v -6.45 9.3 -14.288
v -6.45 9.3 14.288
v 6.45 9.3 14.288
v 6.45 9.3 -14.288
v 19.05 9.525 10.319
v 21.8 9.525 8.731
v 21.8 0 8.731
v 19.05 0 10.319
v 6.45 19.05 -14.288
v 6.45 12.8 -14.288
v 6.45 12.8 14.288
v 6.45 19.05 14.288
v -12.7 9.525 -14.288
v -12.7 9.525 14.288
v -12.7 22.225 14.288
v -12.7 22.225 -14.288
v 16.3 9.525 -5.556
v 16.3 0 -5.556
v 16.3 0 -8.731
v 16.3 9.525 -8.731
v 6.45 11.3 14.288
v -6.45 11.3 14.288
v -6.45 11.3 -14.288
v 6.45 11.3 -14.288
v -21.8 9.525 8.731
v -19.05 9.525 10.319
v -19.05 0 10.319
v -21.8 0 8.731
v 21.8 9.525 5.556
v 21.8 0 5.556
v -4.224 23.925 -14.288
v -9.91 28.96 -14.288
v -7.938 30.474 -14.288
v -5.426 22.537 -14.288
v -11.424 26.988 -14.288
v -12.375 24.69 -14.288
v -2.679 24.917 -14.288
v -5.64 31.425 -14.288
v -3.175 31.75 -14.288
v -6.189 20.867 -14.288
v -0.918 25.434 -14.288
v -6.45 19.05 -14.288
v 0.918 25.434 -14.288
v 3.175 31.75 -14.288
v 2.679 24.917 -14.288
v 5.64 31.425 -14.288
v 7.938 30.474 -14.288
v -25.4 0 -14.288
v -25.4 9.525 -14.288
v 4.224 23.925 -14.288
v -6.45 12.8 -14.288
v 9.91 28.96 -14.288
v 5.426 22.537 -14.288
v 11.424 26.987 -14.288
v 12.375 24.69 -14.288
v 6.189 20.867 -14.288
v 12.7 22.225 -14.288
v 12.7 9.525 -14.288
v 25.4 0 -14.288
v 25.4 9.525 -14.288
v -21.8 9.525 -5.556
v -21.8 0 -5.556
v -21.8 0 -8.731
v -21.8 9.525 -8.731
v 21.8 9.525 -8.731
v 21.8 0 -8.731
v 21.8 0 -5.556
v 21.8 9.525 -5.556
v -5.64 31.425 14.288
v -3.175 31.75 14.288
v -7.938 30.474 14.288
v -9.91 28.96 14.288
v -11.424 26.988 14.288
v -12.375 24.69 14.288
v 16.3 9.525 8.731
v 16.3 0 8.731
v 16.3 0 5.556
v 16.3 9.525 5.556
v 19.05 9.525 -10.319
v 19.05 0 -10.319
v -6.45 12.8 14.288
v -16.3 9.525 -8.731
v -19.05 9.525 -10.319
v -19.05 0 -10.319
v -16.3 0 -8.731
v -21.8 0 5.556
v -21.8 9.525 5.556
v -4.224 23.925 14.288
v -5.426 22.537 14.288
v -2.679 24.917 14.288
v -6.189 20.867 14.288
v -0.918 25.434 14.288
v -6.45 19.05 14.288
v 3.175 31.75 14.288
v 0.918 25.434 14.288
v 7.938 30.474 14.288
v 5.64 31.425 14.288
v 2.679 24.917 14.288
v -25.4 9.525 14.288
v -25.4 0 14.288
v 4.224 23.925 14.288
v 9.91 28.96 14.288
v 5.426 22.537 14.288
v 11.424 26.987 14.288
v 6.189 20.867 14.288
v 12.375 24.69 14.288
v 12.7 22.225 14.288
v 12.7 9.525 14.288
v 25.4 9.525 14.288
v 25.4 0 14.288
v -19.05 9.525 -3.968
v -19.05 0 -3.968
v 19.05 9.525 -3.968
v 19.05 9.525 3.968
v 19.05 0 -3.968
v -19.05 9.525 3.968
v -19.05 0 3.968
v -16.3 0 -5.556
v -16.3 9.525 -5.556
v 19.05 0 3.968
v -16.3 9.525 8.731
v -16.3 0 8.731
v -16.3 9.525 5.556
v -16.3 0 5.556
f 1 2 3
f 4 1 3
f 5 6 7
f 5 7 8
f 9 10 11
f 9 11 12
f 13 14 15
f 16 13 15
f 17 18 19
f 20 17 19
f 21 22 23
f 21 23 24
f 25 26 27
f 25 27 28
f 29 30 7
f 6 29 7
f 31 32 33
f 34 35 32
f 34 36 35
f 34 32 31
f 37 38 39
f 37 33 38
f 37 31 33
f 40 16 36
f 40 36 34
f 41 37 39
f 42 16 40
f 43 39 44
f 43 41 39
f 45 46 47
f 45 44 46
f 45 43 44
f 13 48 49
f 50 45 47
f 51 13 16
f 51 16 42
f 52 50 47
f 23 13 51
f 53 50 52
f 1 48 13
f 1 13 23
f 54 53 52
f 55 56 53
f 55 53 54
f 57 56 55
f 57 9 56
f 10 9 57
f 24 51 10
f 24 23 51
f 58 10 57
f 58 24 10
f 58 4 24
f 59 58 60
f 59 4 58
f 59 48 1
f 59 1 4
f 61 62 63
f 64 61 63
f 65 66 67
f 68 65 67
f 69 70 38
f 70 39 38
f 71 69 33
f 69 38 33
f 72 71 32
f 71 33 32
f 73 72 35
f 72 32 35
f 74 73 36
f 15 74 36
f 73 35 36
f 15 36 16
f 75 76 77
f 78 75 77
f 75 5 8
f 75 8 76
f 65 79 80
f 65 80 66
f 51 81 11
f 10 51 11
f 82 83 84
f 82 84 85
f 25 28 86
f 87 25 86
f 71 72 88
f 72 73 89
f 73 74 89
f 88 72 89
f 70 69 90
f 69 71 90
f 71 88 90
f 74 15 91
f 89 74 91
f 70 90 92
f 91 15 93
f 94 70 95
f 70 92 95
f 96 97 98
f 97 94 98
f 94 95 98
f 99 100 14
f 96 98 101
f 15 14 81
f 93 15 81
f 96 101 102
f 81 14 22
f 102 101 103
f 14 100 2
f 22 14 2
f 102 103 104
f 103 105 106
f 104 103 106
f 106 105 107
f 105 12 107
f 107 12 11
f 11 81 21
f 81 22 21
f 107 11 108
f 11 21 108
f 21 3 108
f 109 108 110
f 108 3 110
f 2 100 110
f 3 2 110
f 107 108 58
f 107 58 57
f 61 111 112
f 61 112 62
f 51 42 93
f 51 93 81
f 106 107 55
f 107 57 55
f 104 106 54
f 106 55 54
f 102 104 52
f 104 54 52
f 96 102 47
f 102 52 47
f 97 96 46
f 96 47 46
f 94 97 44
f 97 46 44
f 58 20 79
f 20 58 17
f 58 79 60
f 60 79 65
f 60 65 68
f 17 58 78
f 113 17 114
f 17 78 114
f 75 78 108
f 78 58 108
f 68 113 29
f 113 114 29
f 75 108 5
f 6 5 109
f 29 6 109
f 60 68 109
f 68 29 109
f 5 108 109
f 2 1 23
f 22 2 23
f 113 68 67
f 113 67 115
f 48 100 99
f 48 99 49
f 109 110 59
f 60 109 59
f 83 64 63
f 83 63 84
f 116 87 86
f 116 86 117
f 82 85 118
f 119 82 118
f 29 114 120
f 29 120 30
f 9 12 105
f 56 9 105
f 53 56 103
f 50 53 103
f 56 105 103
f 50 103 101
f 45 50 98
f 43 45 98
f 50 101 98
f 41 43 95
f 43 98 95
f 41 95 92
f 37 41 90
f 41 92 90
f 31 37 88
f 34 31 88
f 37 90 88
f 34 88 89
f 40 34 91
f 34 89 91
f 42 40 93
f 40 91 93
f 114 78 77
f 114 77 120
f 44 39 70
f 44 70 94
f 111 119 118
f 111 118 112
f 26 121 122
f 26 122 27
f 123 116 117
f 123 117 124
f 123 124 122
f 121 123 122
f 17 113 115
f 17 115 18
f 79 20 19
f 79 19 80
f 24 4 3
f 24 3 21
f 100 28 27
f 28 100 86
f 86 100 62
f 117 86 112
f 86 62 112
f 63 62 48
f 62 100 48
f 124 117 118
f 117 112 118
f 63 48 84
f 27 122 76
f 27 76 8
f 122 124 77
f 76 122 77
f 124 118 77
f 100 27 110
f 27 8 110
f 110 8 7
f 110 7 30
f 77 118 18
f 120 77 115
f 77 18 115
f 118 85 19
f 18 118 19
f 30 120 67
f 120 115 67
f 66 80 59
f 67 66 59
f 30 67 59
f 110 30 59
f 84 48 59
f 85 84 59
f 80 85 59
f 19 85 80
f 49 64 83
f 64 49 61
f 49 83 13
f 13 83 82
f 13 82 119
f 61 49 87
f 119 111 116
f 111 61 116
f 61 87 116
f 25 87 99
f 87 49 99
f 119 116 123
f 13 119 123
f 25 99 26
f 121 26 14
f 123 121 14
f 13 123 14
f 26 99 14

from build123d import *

# Parameters (mm, degrees)
SKETCH1_W           = 50.8
SKETCH1_H           = 28.575
BOSS_EXTRUDE1_DEPTH = 31.75
SKETCH2_W           = 12.7
SKETCH2_H           = 22.225
SKETCH2_W_2         = 12.9
SKETCH2_H_2         = 2
CUT_EXTRUDE1_DEPTH  = 28.575
FILLET2_R           = 9.525
CUT_EXTRUDE2_REACH  = 45.097


with BuildPart() as part:
    # Sketch1 → Boss-Extrude1 (new body)
    with BuildSketch(Plane(origin=(0, 0, 0), x_dir=(1, 0, 0), z_dir=(0, 1, 0))):
        Rectangle(SKETCH1_W, SKETCH1_H)
    extrude(amount=BOSS_EXTRUDE1_DEPTH)

    # Sketch2 → Cut-Extrude1 (cut)
    with BuildSketch(Plane.XY.offset(14.2875)):
        with Locations((-19.05, 20.6375)):
            Rectangle(SKETCH2_W, SKETCH2_H)
        with BuildLine():
            Line((6.45, 12.8), (6.45, 19.05))
            ThreePointArc((6.45, 19.05), (0, 25.5), (-6.45, 19.05))
            Line((-6.45, 19.05), (-6.45, 12.8))
            Line((-6.45, 12.8), (6.45, 12.8))
        make_face()
        with Locations((0, 10.3)):
            Rectangle(SKETCH2_W_2, SKETCH2_H_2)
        with Locations((19.05, 20.6375)):
            Rectangle(SKETCH2_W, SKETCH2_H)
    extrude(amount=-CUT_EXTRUDE1_DEPTH, mode=Mode.SUBTRACT)

    # Fillet2
    fillet2_edges = [part.edges().sort_by_distance(p)[0] for p in [
        (-12.7, 31.75, 0),
        (12.7, 31.75, 0),
    ]]
    fillet(fillet2_edges, radius=FILLET2_R)

    # Sketch9 → Cut-Extrude2 (cut, up to next)
    with BuildSketch(Plane.XZ, mode=Mode.PRIVATE) as cut_extrude2_sk1:
        Polygon((16.3, -5.55603676), (16.3, -8.73146324), (19.05, -10.319176481), (21.8, -8.73146324), (21.8, -5.55603676), (19.05, -3.968323519), align=None)
    cut_extrude2_tool1 = extrude(cut_extrude2_sk1.sketch, amount=-CUT_EXTRUDE2_REACH, mode=Mode.PRIVATE) & part.part
    # Sketch9 → Cut-Extrude2 (cut, up to next)
    with BuildSketch(Plane.XZ, mode=Mode.PRIVATE) as cut_extrude2_sk2:
        Polygon((16.3, 5.55603676), (19.05, 3.968323519), (21.8, 5.55603676), (21.8, 8.73146324), (19.05, 10.319176481), (16.3, 8.73146324), align=None)
    cut_extrude2_tool2 = extrude(cut_extrude2_sk2.sketch, amount=-CUT_EXTRUDE2_REACH, mode=Mode.PRIVATE) & part.part
    # Sketch9 → Cut-Extrude2 (cut, up to next)
    with BuildSketch(Plane.XZ, mode=Mode.PRIVATE) as cut_extrude2_sk3:
        Polygon((-16.3, -8.73146324), (-16.3, -5.55603676), (-19.05, -3.968323519), (-21.8, -5.55603676), (-21.8, -8.73146324), (-19.05, -10.319176481), align=None)
    cut_extrude2_tool3 = extrude(cut_extrude2_sk3.sketch, amount=-CUT_EXTRUDE2_REACH, mode=Mode.PRIVATE) & part.part
    # Sketch9 → Cut-Extrude2 (cut, up to next)
    with BuildSketch(Plane.XZ, mode=Mode.PRIVATE) as cut_extrude2_sk4:
        Polygon((-16.3, 5.55603676), (-16.3, 8.73146324), (-19.05, 10.319176481), (-21.8, 8.73146324), (-21.8, 5.55603676), (-19.05, 3.968323519), align=None)
    cut_extrude2_tool4 = extrude(cut_extrude2_sk4.sketch, amount=-CUT_EXTRUDE2_REACH, mode=Mode.PRIVATE) & part.part
    add(cut_extrude2_tool1.solids().sort_by_distance((19.05, 0, -7.14375))[0], mode=Mode.SUBTRACT)
    add(cut_extrude2_tool2.solids().sort_by_distance((19.05, 0, 7.14375))[0], mode=Mode.SUBTRACT)
    add(cut_extrude2_tool3.solids().sort_by_distance((-19.05, 0, -7.14375))[0], mode=Mode.SUBTRACT)
    add(cut_extrude2_tool4.solids().sort_by_distance((-19.05, 0, 7.14375))[0], mode=Mode.SUBTRACT)


solid = part.part
